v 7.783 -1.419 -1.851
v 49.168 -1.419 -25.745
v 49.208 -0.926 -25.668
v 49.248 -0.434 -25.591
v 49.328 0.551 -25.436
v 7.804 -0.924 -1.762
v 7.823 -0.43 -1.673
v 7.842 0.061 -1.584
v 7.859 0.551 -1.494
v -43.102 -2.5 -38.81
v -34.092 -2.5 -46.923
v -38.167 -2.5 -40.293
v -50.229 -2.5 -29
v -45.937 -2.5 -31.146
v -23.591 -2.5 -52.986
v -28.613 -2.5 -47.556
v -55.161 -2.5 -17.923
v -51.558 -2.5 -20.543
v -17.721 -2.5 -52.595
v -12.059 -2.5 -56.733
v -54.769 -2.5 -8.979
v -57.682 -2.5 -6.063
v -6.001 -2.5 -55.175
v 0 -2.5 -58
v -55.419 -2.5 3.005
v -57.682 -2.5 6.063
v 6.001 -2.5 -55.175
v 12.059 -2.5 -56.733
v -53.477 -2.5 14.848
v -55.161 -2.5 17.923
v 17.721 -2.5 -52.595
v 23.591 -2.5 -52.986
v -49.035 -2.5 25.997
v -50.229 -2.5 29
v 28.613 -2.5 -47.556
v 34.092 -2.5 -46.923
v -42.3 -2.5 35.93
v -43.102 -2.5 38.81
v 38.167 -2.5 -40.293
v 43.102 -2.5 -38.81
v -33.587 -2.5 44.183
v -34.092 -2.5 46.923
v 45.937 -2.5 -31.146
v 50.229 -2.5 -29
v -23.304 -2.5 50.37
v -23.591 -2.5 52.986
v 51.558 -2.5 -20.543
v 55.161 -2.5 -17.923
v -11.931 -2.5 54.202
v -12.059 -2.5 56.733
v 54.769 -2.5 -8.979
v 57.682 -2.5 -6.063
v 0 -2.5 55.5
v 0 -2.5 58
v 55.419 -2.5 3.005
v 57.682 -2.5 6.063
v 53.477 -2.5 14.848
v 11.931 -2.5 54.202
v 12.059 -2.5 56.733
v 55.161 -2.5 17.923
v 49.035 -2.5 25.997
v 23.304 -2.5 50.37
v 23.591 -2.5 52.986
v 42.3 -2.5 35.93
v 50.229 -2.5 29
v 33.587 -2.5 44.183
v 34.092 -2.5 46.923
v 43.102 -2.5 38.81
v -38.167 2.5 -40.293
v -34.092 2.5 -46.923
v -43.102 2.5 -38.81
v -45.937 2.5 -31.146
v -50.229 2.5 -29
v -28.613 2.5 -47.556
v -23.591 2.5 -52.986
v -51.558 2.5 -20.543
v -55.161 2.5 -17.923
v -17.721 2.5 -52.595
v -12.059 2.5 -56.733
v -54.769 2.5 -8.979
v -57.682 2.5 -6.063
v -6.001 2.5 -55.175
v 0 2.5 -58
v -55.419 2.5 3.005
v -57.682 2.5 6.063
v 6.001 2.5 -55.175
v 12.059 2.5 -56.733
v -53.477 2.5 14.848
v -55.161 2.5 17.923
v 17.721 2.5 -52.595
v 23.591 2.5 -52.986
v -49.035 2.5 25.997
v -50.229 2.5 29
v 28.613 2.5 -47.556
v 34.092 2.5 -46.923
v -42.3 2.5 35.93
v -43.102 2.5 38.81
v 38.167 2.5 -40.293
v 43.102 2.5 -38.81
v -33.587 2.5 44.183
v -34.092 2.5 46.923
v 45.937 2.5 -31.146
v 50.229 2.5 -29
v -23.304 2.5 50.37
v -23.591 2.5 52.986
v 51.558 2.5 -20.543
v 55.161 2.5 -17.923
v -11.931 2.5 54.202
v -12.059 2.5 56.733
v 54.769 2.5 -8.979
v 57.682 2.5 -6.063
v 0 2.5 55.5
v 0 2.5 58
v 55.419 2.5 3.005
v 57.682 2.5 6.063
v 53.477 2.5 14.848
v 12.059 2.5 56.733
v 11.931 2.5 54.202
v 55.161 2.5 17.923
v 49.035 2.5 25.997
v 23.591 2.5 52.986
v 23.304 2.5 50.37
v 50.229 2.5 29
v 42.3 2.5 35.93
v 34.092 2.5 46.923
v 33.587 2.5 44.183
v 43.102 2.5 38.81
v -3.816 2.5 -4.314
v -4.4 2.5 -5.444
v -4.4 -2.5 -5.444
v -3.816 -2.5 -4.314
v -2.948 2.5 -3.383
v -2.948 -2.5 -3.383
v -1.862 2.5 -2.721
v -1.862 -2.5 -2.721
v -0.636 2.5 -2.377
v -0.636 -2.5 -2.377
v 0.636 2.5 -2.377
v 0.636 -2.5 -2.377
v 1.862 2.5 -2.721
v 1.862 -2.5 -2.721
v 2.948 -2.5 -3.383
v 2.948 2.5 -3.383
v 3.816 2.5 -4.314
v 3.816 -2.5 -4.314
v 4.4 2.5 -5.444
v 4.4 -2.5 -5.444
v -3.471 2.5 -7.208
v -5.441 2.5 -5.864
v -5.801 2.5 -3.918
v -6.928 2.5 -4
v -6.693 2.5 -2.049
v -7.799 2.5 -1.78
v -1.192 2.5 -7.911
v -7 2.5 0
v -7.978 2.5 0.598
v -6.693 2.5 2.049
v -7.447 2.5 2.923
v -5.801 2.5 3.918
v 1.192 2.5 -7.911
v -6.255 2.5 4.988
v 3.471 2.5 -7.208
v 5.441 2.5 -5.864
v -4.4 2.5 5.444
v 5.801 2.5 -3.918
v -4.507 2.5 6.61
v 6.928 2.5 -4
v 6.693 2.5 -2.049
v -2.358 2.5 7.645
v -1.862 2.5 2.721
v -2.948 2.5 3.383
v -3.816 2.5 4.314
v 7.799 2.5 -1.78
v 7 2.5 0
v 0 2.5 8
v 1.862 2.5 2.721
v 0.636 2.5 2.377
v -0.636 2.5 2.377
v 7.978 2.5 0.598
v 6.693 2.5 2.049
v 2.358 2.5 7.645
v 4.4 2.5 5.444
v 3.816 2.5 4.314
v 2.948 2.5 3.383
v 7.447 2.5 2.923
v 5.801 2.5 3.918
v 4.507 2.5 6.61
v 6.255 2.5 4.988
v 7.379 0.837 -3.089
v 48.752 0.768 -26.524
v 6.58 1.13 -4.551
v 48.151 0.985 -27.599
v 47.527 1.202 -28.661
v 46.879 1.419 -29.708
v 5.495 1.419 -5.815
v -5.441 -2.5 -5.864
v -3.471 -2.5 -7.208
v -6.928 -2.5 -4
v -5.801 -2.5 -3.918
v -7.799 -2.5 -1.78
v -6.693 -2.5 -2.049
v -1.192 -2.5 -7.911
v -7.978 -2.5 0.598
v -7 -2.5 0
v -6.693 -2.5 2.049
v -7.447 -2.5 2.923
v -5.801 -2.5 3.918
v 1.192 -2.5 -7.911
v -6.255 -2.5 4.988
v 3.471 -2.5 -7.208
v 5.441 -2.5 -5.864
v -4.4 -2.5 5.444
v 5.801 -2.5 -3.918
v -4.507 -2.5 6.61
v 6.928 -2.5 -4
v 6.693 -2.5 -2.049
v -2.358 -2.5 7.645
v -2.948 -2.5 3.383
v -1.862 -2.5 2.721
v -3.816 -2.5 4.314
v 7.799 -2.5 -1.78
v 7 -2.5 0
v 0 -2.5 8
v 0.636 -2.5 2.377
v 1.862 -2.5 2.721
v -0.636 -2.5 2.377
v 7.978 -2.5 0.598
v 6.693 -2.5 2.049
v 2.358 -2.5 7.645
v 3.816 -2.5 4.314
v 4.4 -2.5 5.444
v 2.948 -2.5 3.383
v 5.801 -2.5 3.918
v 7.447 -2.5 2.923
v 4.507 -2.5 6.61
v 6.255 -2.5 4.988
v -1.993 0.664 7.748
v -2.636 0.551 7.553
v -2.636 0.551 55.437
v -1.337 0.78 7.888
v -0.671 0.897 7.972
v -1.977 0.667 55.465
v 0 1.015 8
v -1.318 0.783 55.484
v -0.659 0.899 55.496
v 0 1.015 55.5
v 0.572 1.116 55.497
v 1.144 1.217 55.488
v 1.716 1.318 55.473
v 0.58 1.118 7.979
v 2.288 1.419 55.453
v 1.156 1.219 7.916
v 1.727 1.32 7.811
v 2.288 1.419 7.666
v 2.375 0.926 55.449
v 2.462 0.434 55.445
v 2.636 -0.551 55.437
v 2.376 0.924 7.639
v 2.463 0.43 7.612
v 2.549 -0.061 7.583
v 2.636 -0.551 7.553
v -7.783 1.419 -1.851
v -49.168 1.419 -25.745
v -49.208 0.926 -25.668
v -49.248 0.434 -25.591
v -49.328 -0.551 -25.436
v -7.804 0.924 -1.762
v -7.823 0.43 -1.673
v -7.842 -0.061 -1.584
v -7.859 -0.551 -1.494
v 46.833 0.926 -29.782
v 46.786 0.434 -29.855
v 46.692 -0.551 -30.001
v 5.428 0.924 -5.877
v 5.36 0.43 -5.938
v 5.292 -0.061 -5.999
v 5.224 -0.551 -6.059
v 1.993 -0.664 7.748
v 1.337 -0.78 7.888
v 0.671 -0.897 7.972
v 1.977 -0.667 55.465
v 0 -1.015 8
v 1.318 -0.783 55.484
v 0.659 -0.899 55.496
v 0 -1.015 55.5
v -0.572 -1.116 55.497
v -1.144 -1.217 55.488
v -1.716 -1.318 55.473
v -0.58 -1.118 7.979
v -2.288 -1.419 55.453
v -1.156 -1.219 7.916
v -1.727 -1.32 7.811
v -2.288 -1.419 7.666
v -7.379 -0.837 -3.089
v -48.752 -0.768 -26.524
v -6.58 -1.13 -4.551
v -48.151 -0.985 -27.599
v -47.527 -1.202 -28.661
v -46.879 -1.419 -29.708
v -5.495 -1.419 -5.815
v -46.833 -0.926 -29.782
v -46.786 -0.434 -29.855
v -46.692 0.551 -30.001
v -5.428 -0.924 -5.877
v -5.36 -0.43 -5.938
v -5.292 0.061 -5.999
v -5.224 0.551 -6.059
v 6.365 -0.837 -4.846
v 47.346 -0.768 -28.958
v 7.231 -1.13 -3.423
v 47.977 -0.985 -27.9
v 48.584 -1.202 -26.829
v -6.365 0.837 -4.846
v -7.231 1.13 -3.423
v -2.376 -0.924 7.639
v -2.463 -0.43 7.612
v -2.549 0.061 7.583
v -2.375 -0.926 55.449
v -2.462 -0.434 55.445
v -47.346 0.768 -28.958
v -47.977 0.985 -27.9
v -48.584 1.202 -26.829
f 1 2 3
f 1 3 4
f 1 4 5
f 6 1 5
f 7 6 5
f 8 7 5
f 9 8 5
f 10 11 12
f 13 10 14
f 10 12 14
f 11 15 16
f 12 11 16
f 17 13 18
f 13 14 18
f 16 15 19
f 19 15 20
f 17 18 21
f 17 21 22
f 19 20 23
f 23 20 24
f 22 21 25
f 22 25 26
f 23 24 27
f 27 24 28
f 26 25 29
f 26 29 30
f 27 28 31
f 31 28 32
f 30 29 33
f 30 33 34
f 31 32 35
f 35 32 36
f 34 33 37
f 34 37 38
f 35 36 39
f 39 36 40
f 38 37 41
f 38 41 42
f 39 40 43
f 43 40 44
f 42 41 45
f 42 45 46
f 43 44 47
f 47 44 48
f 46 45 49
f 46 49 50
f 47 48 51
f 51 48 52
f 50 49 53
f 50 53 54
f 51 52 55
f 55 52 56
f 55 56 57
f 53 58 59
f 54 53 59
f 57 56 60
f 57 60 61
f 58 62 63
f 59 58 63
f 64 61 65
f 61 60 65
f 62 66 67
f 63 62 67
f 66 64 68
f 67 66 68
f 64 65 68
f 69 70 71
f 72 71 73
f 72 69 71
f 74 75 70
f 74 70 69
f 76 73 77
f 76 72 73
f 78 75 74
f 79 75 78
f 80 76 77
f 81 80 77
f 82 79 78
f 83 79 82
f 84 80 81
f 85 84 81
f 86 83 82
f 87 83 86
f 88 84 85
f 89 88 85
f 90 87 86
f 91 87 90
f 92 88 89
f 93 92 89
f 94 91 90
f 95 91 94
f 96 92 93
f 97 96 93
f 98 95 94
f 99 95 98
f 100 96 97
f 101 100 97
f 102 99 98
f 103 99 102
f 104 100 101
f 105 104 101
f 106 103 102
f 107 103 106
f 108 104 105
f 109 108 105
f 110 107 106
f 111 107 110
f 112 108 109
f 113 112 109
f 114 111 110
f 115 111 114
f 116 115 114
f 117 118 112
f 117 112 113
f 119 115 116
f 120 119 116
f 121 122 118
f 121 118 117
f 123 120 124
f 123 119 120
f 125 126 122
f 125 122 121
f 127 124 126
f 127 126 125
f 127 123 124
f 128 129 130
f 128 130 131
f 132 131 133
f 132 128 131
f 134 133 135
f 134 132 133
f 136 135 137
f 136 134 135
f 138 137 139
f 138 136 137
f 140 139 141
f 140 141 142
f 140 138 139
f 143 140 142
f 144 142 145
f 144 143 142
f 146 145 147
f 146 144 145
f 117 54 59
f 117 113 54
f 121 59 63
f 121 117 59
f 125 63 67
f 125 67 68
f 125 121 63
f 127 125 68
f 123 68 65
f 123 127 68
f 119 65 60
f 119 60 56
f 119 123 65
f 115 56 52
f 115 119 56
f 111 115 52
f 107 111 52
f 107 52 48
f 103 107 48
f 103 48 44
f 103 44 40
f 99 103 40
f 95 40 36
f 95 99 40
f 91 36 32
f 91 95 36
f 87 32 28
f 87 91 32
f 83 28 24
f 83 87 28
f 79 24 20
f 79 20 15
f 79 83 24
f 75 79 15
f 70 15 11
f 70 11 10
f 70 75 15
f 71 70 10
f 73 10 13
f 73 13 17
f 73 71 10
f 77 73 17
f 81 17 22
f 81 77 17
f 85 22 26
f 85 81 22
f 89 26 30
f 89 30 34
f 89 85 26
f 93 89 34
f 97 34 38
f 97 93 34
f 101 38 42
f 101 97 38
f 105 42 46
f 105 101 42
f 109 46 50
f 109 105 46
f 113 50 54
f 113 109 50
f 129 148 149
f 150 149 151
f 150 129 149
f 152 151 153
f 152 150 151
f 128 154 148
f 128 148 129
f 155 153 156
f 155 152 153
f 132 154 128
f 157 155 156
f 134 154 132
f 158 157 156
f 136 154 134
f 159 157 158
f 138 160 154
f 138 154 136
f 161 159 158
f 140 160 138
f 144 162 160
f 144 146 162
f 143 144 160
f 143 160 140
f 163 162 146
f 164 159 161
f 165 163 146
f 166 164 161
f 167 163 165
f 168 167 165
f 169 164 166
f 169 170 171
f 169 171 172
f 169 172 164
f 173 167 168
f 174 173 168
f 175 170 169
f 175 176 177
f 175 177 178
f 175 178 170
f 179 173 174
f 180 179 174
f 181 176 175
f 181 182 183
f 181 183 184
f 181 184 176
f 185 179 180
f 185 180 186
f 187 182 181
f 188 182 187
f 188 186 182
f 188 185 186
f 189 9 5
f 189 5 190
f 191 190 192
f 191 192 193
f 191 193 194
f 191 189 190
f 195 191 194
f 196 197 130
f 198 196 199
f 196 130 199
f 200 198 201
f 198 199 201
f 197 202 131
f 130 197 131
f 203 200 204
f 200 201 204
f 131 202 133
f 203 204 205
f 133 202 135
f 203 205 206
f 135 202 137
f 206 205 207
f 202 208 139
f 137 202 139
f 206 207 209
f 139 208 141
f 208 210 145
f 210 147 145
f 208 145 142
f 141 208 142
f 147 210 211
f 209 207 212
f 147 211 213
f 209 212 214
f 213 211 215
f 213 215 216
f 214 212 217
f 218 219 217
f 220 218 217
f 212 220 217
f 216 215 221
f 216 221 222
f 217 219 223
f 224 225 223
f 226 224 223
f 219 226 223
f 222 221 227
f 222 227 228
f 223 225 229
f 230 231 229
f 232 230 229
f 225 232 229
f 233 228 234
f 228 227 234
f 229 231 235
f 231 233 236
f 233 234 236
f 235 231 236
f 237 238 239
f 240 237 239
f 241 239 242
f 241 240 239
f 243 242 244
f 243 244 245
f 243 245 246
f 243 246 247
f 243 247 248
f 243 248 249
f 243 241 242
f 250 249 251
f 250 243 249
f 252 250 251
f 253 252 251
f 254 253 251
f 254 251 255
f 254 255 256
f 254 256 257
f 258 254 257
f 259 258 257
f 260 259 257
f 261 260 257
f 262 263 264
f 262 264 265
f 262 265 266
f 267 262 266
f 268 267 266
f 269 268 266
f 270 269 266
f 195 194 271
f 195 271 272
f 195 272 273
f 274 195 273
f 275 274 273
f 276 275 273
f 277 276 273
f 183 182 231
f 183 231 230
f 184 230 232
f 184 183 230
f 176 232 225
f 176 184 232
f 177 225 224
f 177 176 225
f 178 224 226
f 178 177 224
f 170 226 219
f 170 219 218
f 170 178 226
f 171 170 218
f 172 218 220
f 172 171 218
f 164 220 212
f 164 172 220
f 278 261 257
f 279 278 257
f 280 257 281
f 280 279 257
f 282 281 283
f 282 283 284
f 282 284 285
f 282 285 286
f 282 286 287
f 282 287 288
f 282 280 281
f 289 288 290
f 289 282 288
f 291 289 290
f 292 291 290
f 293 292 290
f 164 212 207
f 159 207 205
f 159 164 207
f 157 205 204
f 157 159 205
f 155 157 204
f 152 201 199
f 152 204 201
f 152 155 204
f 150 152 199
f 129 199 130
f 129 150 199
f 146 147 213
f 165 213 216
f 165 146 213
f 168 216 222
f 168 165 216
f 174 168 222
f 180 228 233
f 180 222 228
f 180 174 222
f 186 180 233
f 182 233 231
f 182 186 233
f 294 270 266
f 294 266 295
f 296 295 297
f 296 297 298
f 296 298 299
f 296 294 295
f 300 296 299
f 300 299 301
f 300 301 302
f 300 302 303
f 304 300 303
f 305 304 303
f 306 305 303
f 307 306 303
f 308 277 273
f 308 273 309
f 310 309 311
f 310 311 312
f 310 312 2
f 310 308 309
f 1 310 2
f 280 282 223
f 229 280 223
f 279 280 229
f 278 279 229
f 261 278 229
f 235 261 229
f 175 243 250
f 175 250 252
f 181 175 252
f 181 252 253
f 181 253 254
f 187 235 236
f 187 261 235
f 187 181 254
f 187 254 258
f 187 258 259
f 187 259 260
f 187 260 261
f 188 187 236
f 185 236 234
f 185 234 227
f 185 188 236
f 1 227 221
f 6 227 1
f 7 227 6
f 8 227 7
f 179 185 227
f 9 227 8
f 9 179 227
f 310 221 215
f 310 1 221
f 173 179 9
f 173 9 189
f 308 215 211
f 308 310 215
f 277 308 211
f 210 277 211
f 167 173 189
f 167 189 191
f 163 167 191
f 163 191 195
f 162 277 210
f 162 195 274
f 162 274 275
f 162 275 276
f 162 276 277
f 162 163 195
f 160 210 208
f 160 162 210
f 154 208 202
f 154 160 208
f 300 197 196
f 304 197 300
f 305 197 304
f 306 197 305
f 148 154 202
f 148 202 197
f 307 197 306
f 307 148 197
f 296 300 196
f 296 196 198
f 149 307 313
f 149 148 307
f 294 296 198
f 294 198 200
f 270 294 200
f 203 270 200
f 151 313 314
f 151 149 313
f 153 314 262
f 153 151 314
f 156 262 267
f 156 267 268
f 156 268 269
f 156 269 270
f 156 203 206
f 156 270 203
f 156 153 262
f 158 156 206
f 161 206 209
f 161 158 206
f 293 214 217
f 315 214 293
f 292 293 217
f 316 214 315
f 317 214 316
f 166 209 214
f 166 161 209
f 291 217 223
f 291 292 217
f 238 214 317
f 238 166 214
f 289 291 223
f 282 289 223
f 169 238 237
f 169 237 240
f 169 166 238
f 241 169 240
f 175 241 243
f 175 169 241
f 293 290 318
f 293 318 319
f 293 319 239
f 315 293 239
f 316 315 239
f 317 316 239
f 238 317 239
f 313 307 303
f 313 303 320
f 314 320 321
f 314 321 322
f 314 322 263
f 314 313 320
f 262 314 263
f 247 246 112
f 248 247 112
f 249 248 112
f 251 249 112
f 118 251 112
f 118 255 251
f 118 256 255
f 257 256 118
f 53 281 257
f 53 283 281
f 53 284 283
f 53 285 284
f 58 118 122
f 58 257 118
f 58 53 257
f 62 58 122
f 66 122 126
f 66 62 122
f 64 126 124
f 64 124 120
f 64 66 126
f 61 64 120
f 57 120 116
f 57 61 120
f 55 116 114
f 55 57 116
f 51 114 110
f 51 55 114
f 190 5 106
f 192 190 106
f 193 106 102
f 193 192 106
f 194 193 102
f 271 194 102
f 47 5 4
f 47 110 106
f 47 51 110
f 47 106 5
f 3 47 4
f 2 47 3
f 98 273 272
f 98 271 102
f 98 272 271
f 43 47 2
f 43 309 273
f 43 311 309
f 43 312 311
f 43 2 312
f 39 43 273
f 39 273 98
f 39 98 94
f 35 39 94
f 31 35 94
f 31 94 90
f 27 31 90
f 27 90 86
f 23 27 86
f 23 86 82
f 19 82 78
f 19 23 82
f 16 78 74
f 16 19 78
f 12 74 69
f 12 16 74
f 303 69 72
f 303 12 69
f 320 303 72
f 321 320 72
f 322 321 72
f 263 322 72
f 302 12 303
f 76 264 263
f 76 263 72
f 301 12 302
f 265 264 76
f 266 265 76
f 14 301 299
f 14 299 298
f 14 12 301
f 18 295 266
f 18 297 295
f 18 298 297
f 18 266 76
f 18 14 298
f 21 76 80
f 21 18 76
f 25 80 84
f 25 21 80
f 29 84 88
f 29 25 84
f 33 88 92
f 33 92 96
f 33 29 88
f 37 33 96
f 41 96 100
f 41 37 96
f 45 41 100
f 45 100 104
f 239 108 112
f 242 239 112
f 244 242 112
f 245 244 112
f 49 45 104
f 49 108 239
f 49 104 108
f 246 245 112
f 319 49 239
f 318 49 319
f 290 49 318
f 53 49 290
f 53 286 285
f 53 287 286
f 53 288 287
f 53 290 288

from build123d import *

# Parameters (mm, degrees)
SKETCH7_R                = 58
SKETCH7_R_2              = 55.5
BOSS_EXTRUDE4_DEPTH      = 2.5
BOSS_EXTRUDE5_REACH      = 84.062
BOSS_EXTRUDE5_END_RADIUS = 55.5
SKETCH2_R                = 8
BOSS_EXTRUDE6_DEPTH      = 2.5
CIRPATTERN5_COUNT        = 3
CUT_EXTRUDE2_DEPTH       = 10


with BuildPart() as part:
    # Sketch7 → Boss-Extrude4 (new, symmetric)
    with BuildSketch(Plane(origin=(0, 0, 0), x_dir=(1, 0, 0), z_dir=(0, 1, 0))):
        with Locations(Location((0, 0, 0), (0, 0, 270))):
            Circle(SKETCH7_R)
        with Locations(Location((0, 0, 0), (0, 0, 270))):
            Circle(SKETCH7_R_2, mode=Mode.SUBTRACT)
    extrude(amount=BOSS_EXTRUDE4_DEPTH, both=True)

    # Boss-Extrude5: up to this cylinder (the profile starts inside it)
    boss_extrude5_end = Plane(origin=(0, 0, 0), z_dir=(0, -1, 0)) * Cylinder(BOSS_EXTRUDE5_END_RADIUS, 280.124, mode=Mode.PRIVATE)
    # Sketch1 → Boss-Extrude5 (add, up to the surface)
    with BuildSketch(Plane.XY, mode=Mode.PRIVATE) as boss_extrude5_sk1:
        Polygon((2.288371205, 1.418928197), (2.63566756, -0.550687309), (-2.288371205, -1.418928197), (-2.63566756, 0.550687309), align=None)
    boss_extrude5_tool1 = extrude(boss_extrude5_sk1.sketch, amount=BOSS_EXTRUDE5_REACH, mode=Mode.PRIVATE) & boss_extrude5_end
    boss_extrude5 = boss_extrude5_tool1.solids().sort_by_distance((0, 0, 0))[0]
    add(boss_extrude5)

    # Sketch2 → Boss-Extrude6 (add, symmetric)
    with BuildSketch(Plane(origin=(0, 0, 0), x_dir=(1, 0, 0), z_dir=(0, 1, 0))):
        with Locations(Location((0, 0, 0), (0, 0, 270))):
            Circle(SKETCH2_R)
    extrude(amount=BOSS_EXTRUDE6_DEPTH, both=True)

    # CirPattern5: Boss-Extrude5 ×3 about axis
    cirpattern5_axis = Axis((0, 0, 0), (0, 1, 0))
    for i in range(1, CIRPATTERN5_COUNT):
        add(boss_extrude5.rotate(cirpattern5_axis, i * 360 / CIRPATTERN5_COUNT))

    # Sketch9 → Cut-Extrude2 (cut)
    with BuildSketch(Plane(origin=(0, 2.5, 0), x_dir=(1, 0, 0), z_dir=(0, 1, 0))):
        with BuildLine():
            ThreePointArc((-4.399803026, -5.444422222), (-7, 0), (-4.399803026, 5.444422222))
            ThreePointArc((-4.399803026, 5.444422222), (0, 2.3333), (4.399803026, 5.444422222))
            ThreePointArc((4.399803026, 5.444422222), (7, 0), (4.399803026, -5.444422222))
            ThreePointArc((4.399803026, -5.444422222), (0, -2.3333), (-4.399803026, -5.444422222))
        make_face()
    extrude(amount=-CUT_EXTRUDE2_DEPTH, mode=Mode.SUBTRACT)


solid = part.part
